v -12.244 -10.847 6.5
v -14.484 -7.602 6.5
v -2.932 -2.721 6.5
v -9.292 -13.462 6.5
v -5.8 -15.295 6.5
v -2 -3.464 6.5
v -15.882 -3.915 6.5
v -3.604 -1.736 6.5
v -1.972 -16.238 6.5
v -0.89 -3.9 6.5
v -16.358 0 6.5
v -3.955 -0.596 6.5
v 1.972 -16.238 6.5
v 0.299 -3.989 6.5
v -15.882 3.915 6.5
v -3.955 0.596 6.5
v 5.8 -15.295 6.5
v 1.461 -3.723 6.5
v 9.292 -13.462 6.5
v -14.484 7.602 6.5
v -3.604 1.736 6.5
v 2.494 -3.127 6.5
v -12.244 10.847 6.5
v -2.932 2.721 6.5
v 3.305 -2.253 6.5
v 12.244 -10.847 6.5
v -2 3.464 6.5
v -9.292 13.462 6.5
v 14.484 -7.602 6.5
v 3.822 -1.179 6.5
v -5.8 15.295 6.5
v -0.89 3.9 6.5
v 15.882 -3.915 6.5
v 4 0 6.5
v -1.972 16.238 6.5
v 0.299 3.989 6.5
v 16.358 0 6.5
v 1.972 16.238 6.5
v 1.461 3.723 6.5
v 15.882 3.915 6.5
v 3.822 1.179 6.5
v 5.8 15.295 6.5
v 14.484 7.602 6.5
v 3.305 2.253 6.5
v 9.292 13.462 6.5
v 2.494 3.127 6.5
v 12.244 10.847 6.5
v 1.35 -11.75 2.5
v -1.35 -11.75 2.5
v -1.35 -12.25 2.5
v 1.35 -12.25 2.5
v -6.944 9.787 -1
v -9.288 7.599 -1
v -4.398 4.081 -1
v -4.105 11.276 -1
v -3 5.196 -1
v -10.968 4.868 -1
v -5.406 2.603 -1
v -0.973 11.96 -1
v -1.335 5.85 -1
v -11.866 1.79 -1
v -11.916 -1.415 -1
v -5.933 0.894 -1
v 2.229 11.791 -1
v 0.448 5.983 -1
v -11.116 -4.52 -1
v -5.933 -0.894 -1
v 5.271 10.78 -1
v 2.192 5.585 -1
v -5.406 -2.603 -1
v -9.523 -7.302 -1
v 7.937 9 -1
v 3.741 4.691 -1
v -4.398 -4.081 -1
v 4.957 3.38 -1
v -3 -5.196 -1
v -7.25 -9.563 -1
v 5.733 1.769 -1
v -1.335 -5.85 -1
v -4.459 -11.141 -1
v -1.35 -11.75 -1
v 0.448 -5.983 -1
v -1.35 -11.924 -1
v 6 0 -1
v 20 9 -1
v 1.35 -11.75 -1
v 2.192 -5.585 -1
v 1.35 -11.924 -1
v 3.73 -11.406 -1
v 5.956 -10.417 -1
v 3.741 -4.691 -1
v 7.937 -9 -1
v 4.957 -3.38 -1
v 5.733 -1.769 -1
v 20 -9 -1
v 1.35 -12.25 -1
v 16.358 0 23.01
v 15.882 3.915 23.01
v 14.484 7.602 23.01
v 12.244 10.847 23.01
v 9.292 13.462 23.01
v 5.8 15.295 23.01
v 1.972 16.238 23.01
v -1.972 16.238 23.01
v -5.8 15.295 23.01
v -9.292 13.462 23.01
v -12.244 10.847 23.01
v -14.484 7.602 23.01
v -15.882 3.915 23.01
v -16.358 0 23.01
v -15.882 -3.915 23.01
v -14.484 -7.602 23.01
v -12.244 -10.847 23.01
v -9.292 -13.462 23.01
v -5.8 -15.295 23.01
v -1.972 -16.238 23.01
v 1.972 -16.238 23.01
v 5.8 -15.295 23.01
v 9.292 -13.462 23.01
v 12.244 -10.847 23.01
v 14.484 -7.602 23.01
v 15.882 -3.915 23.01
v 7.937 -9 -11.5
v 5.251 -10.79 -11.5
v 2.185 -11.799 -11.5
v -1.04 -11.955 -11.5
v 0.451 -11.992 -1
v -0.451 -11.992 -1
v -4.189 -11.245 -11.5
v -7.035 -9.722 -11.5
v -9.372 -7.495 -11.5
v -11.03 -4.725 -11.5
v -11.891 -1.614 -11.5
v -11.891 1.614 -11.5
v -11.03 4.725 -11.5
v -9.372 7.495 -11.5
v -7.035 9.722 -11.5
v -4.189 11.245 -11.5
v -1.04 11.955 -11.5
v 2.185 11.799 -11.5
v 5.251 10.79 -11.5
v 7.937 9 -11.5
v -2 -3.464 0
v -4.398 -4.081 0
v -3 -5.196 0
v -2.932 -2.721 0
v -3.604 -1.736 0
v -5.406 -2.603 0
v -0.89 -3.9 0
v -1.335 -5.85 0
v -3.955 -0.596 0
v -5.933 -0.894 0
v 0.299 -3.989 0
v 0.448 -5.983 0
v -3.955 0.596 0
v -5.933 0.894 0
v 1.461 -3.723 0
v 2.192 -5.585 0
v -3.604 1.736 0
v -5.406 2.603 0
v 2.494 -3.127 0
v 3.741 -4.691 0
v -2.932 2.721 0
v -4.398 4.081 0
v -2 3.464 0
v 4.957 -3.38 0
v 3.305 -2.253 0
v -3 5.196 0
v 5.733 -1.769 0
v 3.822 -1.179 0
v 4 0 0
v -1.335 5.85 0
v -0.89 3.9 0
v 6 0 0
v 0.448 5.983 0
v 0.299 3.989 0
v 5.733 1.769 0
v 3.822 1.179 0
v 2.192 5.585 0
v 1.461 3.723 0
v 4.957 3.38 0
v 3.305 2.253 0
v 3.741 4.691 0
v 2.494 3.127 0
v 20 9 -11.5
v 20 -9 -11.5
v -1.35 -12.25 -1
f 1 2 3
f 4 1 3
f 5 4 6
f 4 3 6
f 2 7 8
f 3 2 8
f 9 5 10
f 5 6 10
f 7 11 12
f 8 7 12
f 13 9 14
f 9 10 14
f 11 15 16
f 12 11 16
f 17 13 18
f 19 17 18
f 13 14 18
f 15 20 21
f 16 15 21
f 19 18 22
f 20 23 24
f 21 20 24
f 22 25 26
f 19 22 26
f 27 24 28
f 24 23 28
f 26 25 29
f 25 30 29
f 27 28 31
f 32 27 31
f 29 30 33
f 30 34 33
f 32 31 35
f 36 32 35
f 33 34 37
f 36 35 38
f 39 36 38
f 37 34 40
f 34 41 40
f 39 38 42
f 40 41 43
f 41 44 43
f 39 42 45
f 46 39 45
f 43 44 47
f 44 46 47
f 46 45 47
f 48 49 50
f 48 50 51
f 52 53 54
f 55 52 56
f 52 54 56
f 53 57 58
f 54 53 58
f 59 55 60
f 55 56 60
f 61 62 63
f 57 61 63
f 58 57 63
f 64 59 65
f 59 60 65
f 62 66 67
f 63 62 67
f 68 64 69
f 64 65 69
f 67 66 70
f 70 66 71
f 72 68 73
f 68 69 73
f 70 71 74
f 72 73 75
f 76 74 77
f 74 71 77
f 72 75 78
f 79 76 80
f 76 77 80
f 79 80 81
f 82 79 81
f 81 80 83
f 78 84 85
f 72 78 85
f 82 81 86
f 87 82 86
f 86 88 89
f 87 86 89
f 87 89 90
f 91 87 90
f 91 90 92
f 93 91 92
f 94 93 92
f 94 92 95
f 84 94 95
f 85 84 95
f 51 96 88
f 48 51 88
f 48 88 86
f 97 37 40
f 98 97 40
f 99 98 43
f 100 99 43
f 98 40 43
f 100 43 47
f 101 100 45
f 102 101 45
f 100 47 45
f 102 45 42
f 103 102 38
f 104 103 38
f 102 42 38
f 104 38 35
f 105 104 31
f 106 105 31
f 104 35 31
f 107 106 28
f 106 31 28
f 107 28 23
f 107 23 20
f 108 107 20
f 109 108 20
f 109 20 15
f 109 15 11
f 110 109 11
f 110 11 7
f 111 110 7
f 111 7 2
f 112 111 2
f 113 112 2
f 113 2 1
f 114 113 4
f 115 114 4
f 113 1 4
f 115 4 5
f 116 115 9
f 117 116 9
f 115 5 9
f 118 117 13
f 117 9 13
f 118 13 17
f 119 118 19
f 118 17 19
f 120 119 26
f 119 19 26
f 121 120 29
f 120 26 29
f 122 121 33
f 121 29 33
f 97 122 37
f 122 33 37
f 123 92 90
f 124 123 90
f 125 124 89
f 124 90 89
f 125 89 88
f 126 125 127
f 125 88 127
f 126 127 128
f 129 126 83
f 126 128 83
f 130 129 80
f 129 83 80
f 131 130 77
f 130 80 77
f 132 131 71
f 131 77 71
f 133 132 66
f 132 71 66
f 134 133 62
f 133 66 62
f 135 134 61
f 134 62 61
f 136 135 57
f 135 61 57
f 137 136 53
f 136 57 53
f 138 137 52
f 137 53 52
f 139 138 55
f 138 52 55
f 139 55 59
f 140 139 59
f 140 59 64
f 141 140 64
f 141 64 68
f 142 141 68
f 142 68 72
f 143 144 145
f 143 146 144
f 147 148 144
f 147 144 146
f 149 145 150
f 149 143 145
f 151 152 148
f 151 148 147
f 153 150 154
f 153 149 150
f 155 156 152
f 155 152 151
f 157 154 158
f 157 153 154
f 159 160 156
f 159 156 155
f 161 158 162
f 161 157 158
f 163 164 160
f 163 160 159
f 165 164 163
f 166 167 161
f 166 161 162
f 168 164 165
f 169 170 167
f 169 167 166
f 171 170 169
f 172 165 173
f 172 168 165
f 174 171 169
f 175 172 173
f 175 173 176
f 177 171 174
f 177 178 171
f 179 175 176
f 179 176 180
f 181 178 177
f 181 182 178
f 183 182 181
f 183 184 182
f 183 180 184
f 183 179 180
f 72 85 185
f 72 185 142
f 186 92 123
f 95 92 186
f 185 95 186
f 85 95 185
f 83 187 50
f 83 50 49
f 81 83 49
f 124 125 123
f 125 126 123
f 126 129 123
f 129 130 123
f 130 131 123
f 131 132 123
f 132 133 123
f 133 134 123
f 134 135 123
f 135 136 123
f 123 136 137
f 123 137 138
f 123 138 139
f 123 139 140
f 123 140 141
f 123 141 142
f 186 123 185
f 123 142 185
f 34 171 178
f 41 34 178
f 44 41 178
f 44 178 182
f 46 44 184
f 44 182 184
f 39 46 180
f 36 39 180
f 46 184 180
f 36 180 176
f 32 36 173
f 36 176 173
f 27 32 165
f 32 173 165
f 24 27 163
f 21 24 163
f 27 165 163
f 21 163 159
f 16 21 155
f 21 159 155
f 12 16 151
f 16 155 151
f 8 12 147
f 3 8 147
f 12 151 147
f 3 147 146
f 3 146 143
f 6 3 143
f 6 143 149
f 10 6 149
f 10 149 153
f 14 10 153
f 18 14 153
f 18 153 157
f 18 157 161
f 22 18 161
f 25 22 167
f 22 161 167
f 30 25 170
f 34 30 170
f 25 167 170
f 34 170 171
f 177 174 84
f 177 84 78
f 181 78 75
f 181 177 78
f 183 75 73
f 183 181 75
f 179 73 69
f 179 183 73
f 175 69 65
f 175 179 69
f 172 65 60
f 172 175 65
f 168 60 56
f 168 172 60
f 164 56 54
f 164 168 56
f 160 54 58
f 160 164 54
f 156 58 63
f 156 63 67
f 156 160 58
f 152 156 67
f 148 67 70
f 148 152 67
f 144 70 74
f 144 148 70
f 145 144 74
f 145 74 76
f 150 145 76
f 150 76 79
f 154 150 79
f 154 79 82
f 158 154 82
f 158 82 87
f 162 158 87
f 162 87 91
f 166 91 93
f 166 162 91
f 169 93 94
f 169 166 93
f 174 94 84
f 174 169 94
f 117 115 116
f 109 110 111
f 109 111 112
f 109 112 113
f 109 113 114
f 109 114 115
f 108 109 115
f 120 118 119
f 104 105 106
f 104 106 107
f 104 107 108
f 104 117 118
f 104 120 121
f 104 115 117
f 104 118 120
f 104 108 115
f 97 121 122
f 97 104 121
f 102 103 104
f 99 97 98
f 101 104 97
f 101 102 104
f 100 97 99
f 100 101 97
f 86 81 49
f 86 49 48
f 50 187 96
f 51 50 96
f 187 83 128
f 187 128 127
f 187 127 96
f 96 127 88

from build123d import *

# Parameters (mm, degrees)
F0_R      = 6
F1_DEPTH  = 1
F2_R      = 12
F2_R_2    = 6
F3_DEPTH  = 10.5
F5_DEPTH  = 10.5
F6_R      = 4
F7_DEPTH  = 6.5
F8_R      = 3
F9_DEPTH  = 8.382
F10_W     = 2.7
F10_H     = 0.5
F11_DEPTH = 3.5
F12_R     = 16.3576
F13_DEPTH = 16.51


with BuildPart() as f1:
    # F0 (on Top) → F1 (new body)
    with BuildSketch(Plane.XY):
        Circle(F0_R)
    extrude(amount=-F1_DEPTH)

    # F2 (on face) → F3 (join)
    with BuildSketch(Plane(origin=(0, 0, -1), x_dir=(1, 0, 0), z_dir=(0, 0, -1))):
        Circle(F2_R)
        Circle(F2_R_2, mode=Mode.SUBTRACT)
        Circle(F2_R_2)
    extrude(amount=F3_DEPTH)

    # F4 (on face) → F5 (join, through all)
    with BuildSketch(Plane.XY.offset(-1)):
        with BuildLine():
            Line((6.35, 9), (6.35, -9))
            Line((6.35, -9), (7.9372539332, -9))
            ThreePointArc((7.9372539332, -9), (10.9372539332, -4.9372539332), (12, 0))
            ThreePointArc((12, 0), (10.9372539332, 4.9372539332), (7.9372539332, 9))
            Line((7.9372539332, 9), (6.35, 9))
        make_face()
        with BuildLine():
            ThreePointArc((12, 0), (10.9372539332, -4.9372539332), (7.9372539332, -9))
            Line((7.9372539332, -9), (20, -9))
            Line((20, -9), (20, 9))
            Line((20, 9), (7.9372539332, 9))
            ThreePointArc((7.9372539332, 9), (10.9372539332, 4.9372539332), (12, 0))
        make_face()
    extrude(amount=-F5_DEPTH)

    # F6 (on face) → F7 (join)
    with BuildSketch(Plane.XY):
        Circle(F6_R)
    extrude(amount=F7_DEPTH)

    # F8 (on face) → F9 (join)
    with BuildSketch(Plane.XY.offset(6.5)):
        Circle(F8_R)
    extrude(amount=F9_DEPTH)

    # F10 (on face) → F11 (join)
    with BuildSketch(Plane.XY.offset(-1)):
        with Locations((0, -12)):
            Rectangle(F10_W, F10_H)
    extrude(amount=F11_DEPTH)

    # F12 (on face) → F13 (join)
    with BuildSketch(Plane.XY.offset(6.5)):
        Circle(F12_R)
    extrude(amount=F13_DEPTH)


solid = f1.part
